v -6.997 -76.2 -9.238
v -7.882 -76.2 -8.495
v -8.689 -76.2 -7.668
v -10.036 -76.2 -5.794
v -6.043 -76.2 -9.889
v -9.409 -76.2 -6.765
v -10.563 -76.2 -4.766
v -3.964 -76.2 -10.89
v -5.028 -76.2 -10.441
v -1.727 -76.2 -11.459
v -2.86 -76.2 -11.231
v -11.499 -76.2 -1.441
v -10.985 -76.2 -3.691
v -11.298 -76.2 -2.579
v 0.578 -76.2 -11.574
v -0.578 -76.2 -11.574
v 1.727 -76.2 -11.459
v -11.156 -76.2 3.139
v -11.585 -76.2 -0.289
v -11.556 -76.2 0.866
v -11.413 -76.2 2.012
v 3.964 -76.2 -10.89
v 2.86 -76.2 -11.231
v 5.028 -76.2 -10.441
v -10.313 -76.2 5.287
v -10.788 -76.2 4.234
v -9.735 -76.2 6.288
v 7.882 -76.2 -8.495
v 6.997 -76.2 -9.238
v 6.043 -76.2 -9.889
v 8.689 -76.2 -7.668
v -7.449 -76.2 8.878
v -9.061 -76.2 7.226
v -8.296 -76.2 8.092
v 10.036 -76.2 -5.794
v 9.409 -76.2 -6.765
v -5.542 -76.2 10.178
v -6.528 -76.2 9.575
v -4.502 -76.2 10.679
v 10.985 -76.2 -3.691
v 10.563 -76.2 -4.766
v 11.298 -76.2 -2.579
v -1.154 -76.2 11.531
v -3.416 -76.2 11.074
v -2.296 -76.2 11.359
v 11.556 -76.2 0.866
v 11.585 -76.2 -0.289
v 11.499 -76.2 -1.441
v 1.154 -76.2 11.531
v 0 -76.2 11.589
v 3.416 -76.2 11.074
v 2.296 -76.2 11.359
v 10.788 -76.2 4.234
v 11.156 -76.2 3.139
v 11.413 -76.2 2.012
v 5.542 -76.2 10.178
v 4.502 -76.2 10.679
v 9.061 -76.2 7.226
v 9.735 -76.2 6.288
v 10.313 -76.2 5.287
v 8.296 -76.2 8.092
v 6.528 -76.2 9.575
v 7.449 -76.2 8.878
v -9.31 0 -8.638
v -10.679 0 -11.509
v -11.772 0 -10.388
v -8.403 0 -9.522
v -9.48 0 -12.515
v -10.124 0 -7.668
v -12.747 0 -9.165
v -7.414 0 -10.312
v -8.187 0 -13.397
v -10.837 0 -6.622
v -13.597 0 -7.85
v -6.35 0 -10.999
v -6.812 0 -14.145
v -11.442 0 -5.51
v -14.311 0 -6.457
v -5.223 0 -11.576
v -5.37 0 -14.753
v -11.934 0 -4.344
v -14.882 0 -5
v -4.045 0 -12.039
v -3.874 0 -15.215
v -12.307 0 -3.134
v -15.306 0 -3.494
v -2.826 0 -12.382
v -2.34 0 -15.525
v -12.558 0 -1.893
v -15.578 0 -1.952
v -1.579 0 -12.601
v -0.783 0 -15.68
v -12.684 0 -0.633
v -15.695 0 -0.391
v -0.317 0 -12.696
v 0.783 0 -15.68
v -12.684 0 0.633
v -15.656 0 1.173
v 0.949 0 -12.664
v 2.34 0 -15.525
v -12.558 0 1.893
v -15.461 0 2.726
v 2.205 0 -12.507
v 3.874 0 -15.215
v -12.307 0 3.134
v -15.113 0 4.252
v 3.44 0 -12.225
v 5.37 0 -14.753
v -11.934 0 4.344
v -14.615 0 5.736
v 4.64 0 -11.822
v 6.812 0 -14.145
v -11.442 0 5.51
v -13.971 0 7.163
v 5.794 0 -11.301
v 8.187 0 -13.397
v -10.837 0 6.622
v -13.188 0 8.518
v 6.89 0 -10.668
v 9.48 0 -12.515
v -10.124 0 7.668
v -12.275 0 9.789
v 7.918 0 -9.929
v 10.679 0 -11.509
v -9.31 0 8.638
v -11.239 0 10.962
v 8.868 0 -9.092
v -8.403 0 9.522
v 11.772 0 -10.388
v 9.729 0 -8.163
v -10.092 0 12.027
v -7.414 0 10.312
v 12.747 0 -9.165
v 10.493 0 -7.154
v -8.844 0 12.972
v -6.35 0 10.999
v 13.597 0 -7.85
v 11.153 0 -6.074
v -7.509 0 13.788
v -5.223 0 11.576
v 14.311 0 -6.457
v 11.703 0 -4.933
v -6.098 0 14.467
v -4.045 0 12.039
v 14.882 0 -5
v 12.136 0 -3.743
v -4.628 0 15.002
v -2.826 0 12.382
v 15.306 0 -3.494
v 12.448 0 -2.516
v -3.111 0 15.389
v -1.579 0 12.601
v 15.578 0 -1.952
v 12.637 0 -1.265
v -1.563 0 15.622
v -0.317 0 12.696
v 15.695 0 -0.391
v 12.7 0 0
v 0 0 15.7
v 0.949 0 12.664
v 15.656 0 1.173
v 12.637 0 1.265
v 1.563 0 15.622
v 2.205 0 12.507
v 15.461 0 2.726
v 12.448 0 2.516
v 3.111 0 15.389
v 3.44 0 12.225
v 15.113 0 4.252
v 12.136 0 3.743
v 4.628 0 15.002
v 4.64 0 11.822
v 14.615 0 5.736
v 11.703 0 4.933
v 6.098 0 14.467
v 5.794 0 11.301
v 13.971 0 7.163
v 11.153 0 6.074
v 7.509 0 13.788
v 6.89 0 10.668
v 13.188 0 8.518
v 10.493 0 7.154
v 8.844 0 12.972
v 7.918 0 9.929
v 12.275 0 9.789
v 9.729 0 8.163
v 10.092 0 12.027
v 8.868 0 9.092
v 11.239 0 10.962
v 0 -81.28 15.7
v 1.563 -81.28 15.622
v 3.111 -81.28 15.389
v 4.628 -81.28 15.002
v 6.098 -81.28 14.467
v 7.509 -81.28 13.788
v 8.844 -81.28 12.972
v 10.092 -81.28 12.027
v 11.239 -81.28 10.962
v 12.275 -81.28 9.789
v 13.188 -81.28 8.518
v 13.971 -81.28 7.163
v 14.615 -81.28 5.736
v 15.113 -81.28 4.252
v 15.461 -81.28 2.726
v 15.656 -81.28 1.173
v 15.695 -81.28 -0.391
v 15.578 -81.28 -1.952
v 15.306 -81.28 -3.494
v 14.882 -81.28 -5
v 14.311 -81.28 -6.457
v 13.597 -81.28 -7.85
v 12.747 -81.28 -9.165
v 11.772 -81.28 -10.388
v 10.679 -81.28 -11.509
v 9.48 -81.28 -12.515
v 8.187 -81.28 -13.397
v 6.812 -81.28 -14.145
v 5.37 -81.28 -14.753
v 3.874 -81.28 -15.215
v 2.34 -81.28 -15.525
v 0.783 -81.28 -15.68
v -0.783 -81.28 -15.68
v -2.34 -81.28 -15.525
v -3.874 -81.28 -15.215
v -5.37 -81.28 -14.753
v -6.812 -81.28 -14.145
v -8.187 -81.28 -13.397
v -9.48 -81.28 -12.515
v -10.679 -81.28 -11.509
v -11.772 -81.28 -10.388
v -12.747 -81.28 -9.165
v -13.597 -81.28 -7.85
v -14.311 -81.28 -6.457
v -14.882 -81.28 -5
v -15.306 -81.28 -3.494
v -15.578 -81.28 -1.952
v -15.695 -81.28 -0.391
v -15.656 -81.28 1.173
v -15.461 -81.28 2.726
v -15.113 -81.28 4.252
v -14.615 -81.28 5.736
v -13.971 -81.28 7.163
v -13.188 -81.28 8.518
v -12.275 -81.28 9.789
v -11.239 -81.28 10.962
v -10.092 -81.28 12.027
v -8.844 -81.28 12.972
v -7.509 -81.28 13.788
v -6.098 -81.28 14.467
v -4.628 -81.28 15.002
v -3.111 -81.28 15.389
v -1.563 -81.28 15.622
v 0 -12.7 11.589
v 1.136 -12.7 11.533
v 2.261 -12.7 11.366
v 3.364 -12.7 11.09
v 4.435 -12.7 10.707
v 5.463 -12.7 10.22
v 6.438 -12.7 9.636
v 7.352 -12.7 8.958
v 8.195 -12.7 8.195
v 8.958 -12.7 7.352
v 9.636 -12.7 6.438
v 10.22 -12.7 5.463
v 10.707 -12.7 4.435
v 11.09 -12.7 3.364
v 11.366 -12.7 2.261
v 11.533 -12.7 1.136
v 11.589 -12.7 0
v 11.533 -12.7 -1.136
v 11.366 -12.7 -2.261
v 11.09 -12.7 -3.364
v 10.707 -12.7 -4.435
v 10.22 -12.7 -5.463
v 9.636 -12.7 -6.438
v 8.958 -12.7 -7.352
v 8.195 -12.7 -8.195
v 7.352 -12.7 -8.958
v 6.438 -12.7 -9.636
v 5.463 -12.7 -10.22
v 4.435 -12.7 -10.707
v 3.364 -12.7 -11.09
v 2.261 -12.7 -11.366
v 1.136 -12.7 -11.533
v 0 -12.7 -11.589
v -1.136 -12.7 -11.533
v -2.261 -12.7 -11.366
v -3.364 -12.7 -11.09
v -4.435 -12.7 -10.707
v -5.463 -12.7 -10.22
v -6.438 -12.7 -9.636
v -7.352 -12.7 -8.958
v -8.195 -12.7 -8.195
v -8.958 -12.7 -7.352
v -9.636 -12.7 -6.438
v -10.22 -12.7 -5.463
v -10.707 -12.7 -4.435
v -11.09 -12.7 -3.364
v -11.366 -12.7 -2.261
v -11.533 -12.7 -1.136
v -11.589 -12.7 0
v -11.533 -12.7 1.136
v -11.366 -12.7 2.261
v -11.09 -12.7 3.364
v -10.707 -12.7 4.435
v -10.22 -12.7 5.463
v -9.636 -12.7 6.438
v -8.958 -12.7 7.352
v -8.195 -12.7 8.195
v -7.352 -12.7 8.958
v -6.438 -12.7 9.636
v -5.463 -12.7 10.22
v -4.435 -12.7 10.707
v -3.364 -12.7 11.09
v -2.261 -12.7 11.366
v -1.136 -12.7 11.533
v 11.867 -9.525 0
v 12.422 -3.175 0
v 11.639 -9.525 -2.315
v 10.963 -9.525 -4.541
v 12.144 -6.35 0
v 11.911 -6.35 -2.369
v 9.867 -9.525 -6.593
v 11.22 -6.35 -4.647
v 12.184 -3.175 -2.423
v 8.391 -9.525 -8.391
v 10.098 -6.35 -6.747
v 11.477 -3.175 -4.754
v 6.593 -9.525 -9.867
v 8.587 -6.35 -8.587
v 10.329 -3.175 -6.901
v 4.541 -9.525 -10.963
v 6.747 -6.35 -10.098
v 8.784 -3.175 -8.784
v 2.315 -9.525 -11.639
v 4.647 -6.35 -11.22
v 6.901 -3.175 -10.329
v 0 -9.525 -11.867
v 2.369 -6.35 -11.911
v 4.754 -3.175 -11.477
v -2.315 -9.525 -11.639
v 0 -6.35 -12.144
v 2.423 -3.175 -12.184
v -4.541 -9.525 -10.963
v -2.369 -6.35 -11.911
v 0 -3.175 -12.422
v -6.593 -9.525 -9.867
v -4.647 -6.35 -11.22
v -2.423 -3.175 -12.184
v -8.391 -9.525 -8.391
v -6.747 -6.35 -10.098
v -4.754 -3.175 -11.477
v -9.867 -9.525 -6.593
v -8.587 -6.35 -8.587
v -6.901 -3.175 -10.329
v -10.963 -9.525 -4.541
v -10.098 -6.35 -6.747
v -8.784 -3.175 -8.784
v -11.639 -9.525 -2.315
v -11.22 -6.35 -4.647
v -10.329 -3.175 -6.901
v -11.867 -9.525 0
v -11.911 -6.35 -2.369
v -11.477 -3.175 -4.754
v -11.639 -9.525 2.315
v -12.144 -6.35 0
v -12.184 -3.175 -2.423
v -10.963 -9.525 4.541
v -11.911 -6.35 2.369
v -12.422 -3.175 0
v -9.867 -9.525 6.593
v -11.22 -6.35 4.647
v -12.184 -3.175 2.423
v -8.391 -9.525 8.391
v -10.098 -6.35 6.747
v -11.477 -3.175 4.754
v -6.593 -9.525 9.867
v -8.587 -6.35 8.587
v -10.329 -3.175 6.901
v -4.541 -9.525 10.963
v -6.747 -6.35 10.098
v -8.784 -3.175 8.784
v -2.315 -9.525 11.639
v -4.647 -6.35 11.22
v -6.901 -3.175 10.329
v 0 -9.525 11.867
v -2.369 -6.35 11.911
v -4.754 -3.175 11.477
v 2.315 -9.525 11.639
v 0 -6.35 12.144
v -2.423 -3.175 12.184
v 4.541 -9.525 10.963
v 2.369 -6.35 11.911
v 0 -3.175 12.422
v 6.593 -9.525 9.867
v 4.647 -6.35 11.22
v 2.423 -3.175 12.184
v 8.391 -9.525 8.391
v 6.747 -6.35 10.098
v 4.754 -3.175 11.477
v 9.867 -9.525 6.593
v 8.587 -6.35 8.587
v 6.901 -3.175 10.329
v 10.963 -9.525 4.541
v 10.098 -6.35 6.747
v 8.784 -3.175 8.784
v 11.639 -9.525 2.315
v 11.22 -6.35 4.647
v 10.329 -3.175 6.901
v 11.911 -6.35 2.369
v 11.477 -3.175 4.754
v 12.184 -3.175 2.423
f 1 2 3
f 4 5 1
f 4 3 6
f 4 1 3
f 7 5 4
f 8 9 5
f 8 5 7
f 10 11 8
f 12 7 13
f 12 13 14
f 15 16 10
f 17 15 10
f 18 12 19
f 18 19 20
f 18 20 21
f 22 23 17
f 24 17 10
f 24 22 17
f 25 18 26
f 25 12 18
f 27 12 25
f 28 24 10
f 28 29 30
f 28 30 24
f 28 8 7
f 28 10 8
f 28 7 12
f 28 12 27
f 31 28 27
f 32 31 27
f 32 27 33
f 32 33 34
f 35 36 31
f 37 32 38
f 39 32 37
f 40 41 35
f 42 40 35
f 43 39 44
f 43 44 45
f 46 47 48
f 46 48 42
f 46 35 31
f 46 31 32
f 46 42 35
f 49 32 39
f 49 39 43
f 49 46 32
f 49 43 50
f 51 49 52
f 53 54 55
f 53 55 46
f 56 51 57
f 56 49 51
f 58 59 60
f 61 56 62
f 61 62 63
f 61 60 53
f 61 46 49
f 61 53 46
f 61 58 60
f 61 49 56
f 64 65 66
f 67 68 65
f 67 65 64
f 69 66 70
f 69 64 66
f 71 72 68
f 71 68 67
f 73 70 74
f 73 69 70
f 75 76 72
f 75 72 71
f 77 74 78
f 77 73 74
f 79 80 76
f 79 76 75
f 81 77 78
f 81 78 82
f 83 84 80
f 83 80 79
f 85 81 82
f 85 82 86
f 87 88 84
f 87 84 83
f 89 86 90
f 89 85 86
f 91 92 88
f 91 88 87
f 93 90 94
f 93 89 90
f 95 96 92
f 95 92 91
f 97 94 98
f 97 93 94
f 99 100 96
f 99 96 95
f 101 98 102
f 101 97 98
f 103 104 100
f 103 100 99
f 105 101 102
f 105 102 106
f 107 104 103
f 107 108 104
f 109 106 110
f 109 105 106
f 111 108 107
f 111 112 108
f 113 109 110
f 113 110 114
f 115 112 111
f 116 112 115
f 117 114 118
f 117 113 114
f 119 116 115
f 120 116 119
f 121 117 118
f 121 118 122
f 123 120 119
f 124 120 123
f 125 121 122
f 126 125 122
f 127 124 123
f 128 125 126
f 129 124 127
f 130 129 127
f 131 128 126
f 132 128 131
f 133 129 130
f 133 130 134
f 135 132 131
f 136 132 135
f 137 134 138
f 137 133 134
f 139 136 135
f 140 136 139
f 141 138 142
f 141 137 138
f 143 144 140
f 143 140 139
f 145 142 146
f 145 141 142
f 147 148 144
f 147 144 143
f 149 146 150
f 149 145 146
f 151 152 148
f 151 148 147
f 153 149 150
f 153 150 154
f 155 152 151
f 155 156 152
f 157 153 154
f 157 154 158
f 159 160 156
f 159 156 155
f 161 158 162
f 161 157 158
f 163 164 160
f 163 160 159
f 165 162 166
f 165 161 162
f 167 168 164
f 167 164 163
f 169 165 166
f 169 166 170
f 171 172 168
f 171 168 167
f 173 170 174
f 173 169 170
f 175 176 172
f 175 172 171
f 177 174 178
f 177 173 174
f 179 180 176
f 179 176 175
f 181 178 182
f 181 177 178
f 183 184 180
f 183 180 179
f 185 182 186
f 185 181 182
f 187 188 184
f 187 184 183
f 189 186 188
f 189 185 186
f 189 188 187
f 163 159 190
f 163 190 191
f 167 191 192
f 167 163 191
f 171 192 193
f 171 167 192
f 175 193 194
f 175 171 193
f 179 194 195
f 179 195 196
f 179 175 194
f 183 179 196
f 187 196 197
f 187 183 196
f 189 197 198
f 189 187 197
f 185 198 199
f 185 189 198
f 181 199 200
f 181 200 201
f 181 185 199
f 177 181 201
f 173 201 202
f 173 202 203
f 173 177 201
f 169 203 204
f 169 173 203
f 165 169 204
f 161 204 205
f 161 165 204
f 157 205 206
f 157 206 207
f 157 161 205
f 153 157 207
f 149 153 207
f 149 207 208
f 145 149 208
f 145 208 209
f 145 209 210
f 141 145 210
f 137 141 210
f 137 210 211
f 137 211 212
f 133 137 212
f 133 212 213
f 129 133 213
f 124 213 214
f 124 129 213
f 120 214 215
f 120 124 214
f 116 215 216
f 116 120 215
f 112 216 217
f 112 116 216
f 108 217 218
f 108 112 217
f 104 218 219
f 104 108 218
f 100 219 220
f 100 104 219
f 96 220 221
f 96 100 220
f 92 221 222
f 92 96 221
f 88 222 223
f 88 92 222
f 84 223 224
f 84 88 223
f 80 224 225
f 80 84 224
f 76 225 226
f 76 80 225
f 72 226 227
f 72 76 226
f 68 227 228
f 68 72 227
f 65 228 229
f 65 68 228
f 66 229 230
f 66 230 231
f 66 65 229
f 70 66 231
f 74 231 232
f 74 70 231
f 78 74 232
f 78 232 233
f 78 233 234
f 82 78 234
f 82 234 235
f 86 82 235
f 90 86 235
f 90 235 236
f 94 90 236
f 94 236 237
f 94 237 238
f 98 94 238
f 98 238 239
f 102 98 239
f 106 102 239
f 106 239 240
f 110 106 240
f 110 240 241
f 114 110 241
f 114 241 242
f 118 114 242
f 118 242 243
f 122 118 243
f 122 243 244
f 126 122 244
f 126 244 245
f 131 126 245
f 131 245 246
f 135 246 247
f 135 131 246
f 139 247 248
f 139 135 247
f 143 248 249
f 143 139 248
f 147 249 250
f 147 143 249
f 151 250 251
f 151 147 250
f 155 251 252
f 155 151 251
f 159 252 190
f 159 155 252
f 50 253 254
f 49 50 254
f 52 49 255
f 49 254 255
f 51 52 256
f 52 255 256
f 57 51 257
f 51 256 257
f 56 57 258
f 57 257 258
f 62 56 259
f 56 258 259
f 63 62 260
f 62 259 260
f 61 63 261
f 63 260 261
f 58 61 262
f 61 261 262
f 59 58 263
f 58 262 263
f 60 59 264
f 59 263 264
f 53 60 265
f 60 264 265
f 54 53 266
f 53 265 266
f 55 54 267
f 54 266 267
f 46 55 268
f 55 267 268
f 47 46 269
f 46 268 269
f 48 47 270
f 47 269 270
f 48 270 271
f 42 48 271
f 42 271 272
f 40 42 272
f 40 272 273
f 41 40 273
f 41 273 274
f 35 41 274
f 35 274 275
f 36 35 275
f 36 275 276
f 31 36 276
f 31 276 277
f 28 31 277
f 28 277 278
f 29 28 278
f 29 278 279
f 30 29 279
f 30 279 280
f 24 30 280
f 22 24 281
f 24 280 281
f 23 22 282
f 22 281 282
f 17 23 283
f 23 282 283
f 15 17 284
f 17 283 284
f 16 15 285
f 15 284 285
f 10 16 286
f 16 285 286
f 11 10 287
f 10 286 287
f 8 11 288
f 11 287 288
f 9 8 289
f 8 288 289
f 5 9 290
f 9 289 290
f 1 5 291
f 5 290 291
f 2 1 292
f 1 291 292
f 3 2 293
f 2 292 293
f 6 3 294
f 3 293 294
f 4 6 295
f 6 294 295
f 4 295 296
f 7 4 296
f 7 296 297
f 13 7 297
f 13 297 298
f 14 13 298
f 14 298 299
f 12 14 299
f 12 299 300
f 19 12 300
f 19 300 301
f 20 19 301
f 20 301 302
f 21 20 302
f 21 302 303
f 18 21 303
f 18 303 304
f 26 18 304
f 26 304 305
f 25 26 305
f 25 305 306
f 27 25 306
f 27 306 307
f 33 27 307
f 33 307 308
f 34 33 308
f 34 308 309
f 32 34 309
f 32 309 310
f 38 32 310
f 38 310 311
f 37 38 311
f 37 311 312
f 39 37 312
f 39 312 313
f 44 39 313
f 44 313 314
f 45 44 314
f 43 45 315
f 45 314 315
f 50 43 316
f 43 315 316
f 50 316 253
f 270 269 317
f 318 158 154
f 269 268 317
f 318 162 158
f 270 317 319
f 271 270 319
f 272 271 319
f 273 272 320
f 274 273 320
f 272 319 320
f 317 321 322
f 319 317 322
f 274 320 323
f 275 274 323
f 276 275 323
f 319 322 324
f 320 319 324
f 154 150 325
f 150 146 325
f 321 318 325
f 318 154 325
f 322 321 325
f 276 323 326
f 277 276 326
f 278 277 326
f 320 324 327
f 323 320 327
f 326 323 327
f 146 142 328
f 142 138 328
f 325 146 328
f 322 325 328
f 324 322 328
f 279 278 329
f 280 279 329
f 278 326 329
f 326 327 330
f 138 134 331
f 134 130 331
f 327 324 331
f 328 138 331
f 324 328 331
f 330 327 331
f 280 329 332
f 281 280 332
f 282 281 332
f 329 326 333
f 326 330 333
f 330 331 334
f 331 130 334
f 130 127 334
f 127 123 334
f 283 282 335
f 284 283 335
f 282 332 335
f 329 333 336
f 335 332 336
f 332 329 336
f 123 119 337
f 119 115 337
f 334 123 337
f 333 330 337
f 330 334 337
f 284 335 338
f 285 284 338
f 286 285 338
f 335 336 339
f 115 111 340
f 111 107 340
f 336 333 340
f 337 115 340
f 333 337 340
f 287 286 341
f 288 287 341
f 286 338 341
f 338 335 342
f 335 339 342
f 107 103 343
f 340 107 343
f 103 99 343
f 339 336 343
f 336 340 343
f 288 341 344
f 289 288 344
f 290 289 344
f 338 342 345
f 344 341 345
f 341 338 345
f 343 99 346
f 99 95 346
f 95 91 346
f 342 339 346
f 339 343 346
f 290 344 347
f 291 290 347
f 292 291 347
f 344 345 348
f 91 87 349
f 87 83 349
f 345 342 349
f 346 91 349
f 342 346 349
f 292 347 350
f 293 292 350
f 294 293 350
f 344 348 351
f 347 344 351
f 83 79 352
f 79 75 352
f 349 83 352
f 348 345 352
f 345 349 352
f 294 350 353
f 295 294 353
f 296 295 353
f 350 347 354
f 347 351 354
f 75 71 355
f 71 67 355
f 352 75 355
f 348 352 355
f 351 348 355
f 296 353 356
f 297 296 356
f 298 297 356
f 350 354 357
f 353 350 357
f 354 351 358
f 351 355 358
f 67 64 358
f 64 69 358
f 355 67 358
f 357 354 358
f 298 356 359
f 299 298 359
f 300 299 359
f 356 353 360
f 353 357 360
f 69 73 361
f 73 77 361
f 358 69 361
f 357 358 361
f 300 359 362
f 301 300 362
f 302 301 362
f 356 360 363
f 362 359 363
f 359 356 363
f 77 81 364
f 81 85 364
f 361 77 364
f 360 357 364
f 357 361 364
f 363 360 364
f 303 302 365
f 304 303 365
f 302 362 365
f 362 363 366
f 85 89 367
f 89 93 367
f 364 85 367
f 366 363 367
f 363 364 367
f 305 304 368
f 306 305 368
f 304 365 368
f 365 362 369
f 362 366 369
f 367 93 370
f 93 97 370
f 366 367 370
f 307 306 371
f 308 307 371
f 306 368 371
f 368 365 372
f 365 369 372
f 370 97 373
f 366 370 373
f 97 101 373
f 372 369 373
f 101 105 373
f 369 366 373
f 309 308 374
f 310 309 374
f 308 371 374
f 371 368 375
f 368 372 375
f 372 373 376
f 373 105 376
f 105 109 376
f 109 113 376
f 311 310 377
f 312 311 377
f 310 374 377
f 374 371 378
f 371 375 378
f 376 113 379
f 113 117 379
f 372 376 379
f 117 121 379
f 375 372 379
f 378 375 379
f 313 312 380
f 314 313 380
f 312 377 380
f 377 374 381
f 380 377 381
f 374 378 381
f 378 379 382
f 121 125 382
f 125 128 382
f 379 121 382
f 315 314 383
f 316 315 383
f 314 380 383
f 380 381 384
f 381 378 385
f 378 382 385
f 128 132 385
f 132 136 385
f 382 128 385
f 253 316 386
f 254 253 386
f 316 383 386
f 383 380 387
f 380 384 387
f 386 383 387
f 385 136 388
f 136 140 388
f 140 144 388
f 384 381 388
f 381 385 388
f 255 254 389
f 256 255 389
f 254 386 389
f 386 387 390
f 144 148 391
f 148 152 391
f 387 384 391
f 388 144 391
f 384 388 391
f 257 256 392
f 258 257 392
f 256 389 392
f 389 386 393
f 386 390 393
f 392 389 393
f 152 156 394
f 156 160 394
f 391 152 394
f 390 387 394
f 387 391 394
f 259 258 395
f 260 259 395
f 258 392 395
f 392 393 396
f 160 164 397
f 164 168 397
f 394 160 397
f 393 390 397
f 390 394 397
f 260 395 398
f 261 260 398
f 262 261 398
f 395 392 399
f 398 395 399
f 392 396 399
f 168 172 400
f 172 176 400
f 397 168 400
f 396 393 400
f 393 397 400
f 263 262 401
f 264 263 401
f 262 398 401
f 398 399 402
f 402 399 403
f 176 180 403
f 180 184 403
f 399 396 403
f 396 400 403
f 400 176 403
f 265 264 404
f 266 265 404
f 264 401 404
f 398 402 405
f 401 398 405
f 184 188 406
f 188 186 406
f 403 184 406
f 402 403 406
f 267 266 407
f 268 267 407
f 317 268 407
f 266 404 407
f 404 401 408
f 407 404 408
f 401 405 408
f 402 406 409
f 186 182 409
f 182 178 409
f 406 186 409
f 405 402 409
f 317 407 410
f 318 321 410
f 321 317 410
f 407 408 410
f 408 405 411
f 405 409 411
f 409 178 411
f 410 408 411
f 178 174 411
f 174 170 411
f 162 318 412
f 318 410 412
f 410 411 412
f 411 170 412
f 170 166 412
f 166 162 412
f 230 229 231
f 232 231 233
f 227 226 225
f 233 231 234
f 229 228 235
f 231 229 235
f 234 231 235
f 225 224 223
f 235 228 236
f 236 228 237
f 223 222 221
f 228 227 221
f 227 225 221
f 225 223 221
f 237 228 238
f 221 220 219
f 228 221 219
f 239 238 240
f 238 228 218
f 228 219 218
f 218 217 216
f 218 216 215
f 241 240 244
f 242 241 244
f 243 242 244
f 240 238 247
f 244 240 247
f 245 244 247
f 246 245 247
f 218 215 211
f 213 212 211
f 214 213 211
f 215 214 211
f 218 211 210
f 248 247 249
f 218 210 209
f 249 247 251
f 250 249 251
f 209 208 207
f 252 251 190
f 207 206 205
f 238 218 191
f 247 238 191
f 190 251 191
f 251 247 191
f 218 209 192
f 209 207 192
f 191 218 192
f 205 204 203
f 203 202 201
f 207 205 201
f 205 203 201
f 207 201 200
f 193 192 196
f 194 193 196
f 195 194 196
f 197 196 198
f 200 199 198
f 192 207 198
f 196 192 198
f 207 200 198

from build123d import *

# Parameters (mm, degrees)
SKETCH1_R           = 12.7
BOSS_EXTRUDE1_DEPTH = 12.7
BOSS_EXTRUDE1_DRAFT = -5
SKETCH2_R           = 3.175
CUT_EXTRUDE1_DEPTH  = 22.997045256
SKETCH7_R           = 1.27
CUT_EXTRUDE2_DEPTH  = 7.62
SKETCH10_R          = 15.7
BOSS_EXTRUDE2_DEPTH = 81.28
SKETCH11_R          = 12.7
CUT_EXTRUDE3_DEPTH  = 12.7
CUT_EXTRUDE3_DRAFT  = -5
SKETCH12_R          = 11.588893973
CUT_EXTRUDE4_DEPTH  = 63.5


with BuildPart() as part:
    # Sketch1 → Boss-Extrude1 (with draft: the straight prism first)
    with BuildSketch(Plane(origin=(0, 0, 0), x_dir=(1, 0, 0), z_dir=(0, 1, 0))):
        Circle(SKETCH1_R)
    extrude(amount=-BOSS_EXTRUDE1_DEPTH)
    # Boss-Extrude1: the draft: its side faces are tilted about the plane it starts from
    boss_extrude1_sides = [part.faces().sort_by_distance(p)[0] for p in [
        (-12.7, -6.35, 0),
    ]]
    draft(boss_extrude1_sides, Plane(origin=(0, 0, 0), x_dir=(1, 0, 0), z_dir=(0, 1, 0)), BOSS_EXTRUDE1_DRAFT)

    # Sketch2 → Cut-Extrude1 (cut, through all)
    with BuildSketch(Plane(origin=(0, 0, 0), x_dir=(1, 0, 0), z_dir=(0, 1, 0))):
        with Locations(Location((0, 0, 0), (0, 0, 270))):
            Circle(SKETCH2_R)
    extrude(amount=-CUT_EXTRUDE1_DEPTH, mode=Mode.SUBTRACT)

    # Sketch7 → Cut-Extrude2 (cut)
    with BuildSketch(Plane.XZ.offset(12.7)):
        with Locations(Location((-8.636, 0, 0), (0, 0, 270))):
            Circle(SKETCH7_R)
        with Locations(Location((4.318, 7.478995387, 0), (0, 0, 270))):
            Circle(SKETCH7_R)
    extrude(amount=-CUT_EXTRUDE2_DEPTH, mode=Mode.SUBTRACT)

    # Sketch10 → Boss-Extrude2 (add)
    with BuildSketch(Plane(origin=(0, 0, 0), x_dir=(1, 0, 0), z_dir=(0, 1, 0))):
        with Locations(Location((0, 0, 0), (0, 0, 270))):
            Circle(SKETCH10_R)
    extrude(amount=-BOSS_EXTRUDE2_DEPTH)


with BuildPart() as cut_extrude3_tool:
    # Sketch11 → Cut-Extrude3 (with draft: the straight prism first)
    with BuildSketch(Plane(origin=(0, 0, 0), x_dir=(1, 0, 0), z_dir=(0, 1, 0))):
        Circle(SKETCH11_R)
    extrude(amount=-CUT_EXTRUDE3_DEPTH)
    # Cut-Extrude3: the draft: its side faces are tilted about the plane it starts from
    cut_extrude3_sides = [cut_extrude3_tool.faces().sort_by_distance(p)[0] for p in [
        (-12.7, -6.35, 0),
    ]]
    draft(cut_extrude3_sides, Plane(origin=(0, 0, 0), x_dir=(1, 0, 0), z_dir=(0, 1, 0)), CUT_EXTRUDE3_DRAFT)


with BuildPart() as part_1:
    add(part.part)

    # Cut-Extrude3: cut by cut_extrude3_tool
    add(cut_extrude3_tool.part, mode=Mode.SUBTRACT)

    # Sketch12 → Cut-Extrude4 (cut)
    with BuildSketch(Plane(origin=(0, -12.7, 0), x_dir=(1, 0, 0), z_dir=(0, 1, 0))):
        with Locations(Location((0, 0, 0), (0, 0, 270))):
            Circle(SKETCH12_R)
    extrude(amount=-CUT_EXTRUDE4_DEPTH, mode=Mode.SUBTRACT)


solid = part_1.part
